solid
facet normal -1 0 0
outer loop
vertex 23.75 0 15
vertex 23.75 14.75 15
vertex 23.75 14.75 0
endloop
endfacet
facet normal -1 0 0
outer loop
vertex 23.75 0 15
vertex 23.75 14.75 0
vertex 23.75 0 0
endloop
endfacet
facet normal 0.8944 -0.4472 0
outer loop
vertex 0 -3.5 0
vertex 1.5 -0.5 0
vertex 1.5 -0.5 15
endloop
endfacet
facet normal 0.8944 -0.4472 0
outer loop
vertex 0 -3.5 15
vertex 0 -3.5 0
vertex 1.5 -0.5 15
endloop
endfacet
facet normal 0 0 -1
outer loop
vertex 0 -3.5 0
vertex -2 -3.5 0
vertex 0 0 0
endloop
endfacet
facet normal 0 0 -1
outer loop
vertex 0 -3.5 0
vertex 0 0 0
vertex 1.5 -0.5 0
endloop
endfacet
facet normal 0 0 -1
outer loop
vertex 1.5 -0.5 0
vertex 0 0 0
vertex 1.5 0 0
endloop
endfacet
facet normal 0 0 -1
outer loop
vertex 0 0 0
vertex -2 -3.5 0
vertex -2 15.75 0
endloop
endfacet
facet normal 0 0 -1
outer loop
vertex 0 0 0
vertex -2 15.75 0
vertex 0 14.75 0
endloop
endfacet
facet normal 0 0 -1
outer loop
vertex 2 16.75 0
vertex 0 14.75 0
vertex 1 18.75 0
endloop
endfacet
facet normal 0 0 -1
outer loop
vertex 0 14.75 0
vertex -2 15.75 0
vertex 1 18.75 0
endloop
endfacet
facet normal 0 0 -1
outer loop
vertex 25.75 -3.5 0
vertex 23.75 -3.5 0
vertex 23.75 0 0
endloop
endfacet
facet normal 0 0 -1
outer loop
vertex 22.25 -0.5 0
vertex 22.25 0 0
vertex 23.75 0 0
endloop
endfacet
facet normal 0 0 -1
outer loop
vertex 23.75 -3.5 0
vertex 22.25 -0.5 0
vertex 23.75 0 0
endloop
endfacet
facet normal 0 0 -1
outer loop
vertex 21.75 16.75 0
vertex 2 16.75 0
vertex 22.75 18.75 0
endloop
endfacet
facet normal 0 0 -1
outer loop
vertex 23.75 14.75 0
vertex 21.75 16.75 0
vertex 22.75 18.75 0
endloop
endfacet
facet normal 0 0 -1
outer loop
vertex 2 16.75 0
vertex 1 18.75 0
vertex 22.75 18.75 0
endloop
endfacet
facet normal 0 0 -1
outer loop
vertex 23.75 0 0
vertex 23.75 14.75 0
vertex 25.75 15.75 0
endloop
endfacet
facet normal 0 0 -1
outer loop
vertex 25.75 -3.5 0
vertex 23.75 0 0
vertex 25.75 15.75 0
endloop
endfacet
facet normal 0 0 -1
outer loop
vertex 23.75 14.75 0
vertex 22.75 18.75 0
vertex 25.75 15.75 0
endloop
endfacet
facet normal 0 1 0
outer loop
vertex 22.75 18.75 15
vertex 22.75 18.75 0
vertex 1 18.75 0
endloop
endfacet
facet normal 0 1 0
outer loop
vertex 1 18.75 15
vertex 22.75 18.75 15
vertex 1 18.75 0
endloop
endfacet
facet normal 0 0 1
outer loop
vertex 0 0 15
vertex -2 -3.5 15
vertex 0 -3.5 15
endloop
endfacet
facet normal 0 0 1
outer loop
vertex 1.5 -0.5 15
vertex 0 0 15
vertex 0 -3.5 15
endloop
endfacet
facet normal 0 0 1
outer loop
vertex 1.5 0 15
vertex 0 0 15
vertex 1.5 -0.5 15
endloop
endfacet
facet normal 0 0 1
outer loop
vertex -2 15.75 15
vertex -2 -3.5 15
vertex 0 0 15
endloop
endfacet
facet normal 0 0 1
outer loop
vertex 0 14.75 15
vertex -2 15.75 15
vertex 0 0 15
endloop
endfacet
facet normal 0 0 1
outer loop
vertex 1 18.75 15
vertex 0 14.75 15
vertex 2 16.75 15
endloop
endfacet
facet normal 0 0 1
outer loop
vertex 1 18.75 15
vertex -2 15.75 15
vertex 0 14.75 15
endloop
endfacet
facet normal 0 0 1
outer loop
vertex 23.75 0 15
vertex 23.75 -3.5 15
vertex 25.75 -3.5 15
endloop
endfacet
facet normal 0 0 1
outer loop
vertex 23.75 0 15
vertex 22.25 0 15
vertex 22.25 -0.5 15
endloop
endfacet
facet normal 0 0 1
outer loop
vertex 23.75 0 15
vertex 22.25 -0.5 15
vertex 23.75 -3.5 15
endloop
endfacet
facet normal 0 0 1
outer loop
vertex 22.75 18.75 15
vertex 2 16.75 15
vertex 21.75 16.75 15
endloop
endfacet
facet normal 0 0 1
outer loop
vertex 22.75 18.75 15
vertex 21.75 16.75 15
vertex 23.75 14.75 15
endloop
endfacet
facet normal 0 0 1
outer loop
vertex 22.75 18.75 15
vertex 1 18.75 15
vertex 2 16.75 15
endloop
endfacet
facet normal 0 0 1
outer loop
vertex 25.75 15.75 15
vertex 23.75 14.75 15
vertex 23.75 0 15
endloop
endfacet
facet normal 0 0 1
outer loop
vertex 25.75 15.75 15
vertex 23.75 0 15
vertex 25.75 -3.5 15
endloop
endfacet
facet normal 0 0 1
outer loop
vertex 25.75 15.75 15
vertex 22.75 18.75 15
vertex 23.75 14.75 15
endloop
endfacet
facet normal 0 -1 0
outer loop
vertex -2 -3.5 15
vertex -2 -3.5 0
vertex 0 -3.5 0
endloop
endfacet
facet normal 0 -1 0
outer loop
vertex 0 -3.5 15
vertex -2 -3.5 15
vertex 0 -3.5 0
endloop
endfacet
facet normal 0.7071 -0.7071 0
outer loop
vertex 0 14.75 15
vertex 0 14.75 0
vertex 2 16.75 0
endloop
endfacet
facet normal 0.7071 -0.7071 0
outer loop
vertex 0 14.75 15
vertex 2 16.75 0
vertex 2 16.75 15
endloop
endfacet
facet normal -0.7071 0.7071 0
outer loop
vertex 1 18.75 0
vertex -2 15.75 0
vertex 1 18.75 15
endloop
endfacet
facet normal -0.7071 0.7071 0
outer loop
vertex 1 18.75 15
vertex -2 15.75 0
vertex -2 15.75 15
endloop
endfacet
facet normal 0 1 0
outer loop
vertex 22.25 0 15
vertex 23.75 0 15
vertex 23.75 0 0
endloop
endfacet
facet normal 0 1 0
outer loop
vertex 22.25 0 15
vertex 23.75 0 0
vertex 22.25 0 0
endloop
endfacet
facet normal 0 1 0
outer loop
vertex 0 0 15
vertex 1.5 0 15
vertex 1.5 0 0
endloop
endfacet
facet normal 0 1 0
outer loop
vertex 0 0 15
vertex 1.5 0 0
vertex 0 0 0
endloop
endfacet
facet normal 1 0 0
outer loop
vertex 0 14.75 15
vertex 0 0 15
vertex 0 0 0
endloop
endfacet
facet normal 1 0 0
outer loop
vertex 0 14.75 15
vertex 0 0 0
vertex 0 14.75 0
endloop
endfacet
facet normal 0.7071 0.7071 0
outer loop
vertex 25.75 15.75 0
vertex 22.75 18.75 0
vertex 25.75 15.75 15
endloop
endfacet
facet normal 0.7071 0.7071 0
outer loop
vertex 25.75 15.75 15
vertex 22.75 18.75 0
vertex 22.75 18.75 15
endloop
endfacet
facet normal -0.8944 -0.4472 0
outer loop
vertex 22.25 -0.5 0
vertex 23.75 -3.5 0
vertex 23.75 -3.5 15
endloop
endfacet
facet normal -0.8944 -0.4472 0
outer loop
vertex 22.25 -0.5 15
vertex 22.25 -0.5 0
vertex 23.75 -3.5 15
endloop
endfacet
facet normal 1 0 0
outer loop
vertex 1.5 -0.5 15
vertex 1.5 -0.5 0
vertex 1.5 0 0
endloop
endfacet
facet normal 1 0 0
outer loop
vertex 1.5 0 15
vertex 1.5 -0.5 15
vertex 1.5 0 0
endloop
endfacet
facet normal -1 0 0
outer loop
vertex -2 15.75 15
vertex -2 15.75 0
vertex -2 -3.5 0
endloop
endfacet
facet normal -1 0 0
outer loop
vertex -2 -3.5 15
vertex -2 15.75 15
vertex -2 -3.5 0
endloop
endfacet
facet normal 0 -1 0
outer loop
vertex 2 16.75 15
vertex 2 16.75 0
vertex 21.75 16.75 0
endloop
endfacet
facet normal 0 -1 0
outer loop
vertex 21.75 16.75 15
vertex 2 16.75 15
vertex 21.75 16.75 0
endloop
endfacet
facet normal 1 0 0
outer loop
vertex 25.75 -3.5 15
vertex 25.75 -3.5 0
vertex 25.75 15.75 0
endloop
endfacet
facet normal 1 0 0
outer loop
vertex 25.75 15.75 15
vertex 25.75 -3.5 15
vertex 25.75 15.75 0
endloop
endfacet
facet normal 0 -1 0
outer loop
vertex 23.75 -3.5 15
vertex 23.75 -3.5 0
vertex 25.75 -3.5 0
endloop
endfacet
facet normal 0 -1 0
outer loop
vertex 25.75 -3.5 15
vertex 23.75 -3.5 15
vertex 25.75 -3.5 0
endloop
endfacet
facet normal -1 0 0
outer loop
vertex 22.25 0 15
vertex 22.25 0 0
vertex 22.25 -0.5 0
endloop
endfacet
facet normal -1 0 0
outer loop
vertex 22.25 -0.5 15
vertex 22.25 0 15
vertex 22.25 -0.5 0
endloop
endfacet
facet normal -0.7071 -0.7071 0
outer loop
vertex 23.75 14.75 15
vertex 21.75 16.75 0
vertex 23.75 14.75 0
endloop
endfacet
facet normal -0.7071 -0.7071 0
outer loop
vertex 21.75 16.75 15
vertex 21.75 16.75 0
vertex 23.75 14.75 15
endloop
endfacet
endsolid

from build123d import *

# Parameters (mm, degrees)
BOSS_EXTRUDE1_DEPTH = 15
CHAMFER1_SIZE       = 3
CHAMFER2_SIZE       = 2
CHAMFER3_SIZE       = 1.5
CHAMFER3_SIZE2      = 3
CHAMFER4_SIZE       = 3
CHAMFER4_SIZE2      = 1.5


with BuildPart() as part:
    # Sketch1 → Boss-Extrude1 (new body)
    with BuildSketch(Plane.XY):
        Polygon((1.5, 0), (0, 0), (0, 16.75), (11.875, 16.75), (11.875, 18.75), (-2, 18.75), (-2, -3.5), (1.5, -3.5), align=None)
        Polygon((11.875, 18.75), (11.875, 16.75), (23.75, 16.75), (23.75, 0), (22.25, 0), (22.25, -3.5), (25.75, -3.5), (25.75, 18.75), align=None)
    extrude(amount=BOSS_EXTRUDE1_DEPTH)

    # Chamfer1
    chamfer1_edges = [part.edges().sort_by_distance(p)[0] for p in [
        (25.75, 18.75, 7.5),
        (-2, 18.75, 7.5),
    ]]
    chamfer(chamfer1_edges, length=CHAMFER1_SIZE)

    # Chamfer2
    chamfer2_edges = [part.edges().sort_by_distance(p)[0] for p in [
        (23.75, 16.75, 7.5),
        (0, 16.75, 7.5),
    ]]
    chamfer(chamfer2_edges, length=CHAMFER2_SIZE)

    # Chamfer3
    chamfer3_edges = [part.edges().sort_by_distance(p)[0] for p in [
        (1.5, -3.5, 7.5),
    ]]
    chamfer3_side = [part.faces().sort_by_distance(p)[0] for p in [
        (-0.25, -3.5, 7.5),
    ]]
    chamfer(chamfer3_edges, length=CHAMFER3_SIZE, length2=CHAMFER3_SIZE2, reference=chamfer3_side[0])

    # Chamfer4
    chamfer4_edges = [part.edges().sort_by_distance(p)[0] for p in [
        (22.25, -3.5, 7.5),
    ]]
    chamfer4_side = [part.faces().sort_by_distance(p)[0] for p in [
        (22.25, -1.75, 7.5),
    ]]
    chamfer(chamfer4_edges, length=CHAMFER4_SIZE, length2=CHAMFER4_SIZE2, reference=chamfer4_side[0])


solid = part.part
